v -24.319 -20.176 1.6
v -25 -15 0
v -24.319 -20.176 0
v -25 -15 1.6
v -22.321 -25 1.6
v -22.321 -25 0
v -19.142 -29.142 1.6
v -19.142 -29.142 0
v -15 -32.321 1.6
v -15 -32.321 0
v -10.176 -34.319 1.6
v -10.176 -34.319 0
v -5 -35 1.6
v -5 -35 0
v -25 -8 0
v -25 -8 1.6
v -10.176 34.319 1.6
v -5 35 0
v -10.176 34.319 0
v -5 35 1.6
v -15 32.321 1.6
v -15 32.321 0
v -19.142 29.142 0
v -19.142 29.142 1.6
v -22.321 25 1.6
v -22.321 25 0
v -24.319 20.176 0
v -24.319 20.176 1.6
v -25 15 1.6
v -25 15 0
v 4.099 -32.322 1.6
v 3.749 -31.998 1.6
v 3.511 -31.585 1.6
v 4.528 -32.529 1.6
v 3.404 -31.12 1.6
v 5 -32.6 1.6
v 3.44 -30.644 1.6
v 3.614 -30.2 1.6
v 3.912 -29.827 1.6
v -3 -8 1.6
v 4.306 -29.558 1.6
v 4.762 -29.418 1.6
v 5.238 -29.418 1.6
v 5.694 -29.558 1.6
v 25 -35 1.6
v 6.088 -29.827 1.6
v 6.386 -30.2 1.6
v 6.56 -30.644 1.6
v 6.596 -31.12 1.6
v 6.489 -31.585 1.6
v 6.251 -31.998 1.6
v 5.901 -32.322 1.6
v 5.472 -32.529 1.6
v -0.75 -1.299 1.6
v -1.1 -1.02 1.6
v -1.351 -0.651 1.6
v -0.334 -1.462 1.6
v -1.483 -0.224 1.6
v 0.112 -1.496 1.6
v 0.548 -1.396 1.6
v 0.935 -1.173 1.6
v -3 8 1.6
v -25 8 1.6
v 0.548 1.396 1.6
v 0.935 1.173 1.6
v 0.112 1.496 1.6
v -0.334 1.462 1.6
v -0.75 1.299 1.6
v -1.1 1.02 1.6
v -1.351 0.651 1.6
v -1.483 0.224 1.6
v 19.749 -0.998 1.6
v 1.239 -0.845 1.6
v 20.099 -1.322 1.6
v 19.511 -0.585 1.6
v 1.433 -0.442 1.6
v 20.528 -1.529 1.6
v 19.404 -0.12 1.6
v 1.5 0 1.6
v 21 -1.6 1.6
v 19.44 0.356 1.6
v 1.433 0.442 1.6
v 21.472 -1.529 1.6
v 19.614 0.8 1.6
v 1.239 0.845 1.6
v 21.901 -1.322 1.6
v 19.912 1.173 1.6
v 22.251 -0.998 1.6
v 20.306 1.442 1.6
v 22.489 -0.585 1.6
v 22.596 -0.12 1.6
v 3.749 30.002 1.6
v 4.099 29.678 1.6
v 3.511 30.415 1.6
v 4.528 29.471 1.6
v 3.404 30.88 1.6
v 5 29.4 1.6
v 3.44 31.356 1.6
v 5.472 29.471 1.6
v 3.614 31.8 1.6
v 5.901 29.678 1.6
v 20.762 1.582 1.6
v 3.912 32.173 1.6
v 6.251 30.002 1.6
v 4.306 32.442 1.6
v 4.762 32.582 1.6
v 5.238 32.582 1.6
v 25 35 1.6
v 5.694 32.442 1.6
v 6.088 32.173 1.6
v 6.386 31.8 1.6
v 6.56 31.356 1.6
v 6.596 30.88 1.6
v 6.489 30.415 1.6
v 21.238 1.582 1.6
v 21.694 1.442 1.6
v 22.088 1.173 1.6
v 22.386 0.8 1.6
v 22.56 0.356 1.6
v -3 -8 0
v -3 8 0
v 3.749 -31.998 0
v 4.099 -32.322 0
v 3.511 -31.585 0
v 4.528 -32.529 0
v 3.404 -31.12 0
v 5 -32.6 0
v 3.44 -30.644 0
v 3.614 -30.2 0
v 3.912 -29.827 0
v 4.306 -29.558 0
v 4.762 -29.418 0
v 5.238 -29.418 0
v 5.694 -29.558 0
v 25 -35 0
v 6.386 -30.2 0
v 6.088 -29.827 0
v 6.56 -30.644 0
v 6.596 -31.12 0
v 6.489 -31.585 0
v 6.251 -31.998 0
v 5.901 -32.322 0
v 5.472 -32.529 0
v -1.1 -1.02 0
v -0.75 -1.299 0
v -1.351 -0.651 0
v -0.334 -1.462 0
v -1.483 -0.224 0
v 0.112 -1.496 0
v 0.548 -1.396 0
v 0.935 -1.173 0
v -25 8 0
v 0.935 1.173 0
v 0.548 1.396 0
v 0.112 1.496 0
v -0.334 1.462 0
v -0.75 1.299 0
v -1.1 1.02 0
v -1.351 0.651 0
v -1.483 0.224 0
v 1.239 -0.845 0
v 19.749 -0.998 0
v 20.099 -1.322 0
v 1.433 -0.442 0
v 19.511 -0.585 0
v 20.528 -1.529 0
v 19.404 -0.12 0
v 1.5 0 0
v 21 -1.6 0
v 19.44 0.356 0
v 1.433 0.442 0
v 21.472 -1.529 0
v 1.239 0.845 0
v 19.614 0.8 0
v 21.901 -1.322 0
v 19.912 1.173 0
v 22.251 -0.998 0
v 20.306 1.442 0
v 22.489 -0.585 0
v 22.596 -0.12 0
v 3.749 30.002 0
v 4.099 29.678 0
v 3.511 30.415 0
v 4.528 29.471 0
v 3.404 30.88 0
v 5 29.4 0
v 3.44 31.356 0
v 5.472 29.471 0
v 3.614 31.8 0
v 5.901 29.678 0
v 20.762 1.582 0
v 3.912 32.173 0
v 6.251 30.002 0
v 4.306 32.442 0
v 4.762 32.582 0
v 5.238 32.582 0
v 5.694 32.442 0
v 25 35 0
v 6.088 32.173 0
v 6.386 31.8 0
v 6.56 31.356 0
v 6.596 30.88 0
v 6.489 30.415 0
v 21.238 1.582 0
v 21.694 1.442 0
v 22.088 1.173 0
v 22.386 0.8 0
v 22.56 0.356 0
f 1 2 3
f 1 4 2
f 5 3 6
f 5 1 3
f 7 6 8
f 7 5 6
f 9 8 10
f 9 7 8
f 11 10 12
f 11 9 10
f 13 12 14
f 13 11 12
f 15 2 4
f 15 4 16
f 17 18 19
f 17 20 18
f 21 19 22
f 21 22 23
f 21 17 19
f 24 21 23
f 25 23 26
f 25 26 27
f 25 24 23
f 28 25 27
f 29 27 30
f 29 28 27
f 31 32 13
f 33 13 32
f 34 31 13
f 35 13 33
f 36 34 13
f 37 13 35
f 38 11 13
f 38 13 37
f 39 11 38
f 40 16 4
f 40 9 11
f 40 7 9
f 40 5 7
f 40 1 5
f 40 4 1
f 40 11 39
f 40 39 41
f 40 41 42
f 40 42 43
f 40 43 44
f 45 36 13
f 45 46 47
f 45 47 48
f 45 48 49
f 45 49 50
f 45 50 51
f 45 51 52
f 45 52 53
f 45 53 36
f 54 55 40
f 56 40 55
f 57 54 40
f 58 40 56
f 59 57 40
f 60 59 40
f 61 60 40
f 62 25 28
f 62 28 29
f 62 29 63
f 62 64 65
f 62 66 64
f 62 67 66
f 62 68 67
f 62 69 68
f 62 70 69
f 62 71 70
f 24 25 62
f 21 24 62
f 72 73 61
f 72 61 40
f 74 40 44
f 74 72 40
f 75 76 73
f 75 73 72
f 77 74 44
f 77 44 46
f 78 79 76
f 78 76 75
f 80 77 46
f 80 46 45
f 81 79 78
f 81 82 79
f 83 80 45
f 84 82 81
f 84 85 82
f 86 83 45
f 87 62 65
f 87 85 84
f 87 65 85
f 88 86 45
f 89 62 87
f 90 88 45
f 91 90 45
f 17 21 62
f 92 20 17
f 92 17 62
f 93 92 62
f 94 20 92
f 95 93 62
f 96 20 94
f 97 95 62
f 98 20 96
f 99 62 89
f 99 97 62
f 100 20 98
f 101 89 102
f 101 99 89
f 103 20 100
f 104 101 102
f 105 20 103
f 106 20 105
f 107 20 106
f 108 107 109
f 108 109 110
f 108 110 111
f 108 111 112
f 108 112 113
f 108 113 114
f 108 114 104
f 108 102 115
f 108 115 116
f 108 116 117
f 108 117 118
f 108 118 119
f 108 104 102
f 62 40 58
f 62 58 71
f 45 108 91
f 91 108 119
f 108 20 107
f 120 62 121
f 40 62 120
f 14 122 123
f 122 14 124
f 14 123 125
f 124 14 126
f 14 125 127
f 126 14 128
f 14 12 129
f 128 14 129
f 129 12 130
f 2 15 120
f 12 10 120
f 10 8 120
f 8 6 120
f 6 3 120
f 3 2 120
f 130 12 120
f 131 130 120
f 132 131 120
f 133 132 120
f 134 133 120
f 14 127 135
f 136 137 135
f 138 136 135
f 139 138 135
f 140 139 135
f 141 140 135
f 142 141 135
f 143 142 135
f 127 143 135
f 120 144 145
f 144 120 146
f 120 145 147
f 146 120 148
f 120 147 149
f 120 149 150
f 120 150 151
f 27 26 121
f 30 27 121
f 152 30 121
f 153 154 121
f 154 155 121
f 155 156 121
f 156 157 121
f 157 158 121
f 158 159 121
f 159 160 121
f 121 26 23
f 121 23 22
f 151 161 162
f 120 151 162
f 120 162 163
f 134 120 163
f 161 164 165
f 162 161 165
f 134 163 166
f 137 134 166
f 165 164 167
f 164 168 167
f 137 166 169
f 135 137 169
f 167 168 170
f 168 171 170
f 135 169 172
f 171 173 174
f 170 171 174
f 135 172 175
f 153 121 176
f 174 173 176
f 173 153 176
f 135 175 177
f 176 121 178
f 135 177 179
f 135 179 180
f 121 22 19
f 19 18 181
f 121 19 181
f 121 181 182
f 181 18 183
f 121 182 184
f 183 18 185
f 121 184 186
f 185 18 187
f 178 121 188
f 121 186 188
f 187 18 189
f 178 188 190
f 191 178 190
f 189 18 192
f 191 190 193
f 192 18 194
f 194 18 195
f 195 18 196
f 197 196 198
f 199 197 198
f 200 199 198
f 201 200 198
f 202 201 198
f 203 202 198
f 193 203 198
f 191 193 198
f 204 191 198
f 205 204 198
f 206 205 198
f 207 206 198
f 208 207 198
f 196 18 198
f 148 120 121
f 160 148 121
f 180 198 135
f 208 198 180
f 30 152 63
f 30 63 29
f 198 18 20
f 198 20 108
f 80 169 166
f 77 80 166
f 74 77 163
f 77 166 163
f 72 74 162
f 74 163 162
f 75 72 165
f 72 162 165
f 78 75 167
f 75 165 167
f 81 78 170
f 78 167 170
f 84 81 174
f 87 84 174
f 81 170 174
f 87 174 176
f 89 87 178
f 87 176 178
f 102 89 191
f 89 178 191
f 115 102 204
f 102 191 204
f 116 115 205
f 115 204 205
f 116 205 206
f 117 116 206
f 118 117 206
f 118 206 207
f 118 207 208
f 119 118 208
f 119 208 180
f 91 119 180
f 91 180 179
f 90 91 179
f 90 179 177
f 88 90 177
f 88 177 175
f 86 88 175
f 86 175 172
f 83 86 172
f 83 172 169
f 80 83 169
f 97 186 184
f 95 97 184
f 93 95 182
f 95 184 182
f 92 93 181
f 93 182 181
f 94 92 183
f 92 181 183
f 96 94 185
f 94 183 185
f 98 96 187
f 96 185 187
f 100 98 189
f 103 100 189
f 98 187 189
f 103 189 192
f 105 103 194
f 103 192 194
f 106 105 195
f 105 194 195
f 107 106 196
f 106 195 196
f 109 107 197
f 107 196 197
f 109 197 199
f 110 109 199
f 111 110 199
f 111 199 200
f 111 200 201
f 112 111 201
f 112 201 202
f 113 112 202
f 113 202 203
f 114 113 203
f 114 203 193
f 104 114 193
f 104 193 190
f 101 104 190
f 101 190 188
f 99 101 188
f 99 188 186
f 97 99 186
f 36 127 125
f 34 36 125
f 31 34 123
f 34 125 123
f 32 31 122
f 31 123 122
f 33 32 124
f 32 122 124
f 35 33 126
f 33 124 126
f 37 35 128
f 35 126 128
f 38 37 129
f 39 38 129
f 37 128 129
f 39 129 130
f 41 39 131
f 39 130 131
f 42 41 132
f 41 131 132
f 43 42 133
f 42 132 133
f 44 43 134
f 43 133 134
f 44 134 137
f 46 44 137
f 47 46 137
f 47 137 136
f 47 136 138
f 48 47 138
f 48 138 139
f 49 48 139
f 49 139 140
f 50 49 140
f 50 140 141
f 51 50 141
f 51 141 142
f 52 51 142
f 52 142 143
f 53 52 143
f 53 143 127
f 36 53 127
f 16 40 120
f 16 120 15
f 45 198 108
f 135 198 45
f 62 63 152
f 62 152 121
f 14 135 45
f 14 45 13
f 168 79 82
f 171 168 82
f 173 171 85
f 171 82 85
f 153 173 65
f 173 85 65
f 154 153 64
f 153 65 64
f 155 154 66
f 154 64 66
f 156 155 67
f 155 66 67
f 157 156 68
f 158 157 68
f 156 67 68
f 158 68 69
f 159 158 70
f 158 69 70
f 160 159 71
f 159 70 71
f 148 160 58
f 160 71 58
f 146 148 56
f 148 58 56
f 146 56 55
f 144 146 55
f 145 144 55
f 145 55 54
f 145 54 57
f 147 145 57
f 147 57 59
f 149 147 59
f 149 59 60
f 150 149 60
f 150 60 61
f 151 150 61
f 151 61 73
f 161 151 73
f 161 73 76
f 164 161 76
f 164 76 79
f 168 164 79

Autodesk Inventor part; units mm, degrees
ref_plane "YZ Plane" through (0, 0, 0) normal (1, 0, 0) x (0, 1, 0)
ref_plane "XZ Plane" through (0, 0, 0) normal (0, 1, 0) x (-1, 0, 0)
ref_plane "XY Plane" through (0, 0, 0) normal (0, 0, 1) x (1, 0, 0)
sketch "スケッチ1" plane through (0, 0, 0) normal (0, 0, 1) x (1, 0, 0)
  line L0 (-25, 35) -> (25, 35)
  line L1 (25, 35) -> (25, -35)
  line L2 (25, -35) -> (-25, -35)
  line L3 (-25, -35) -> (-25, 35)
  point P0 (0, 0)
  point P1 (-25, 0)
  point P2 (0, 35)
  dimension "d0" = 50
  dimension "d1" = 70
extrude "押し出し1" add sketch "スケッチ1" along normal blind 1.6
sketch "スケッチ2" plane through (0, 0, 1.6) normal (0, 0, 1) x (1, 0, 0)
  line L0 (-25, 35) -> (-25, -35) projected
  line L1 (-25, 8) -> (-3, 8)
  line L2 (-3, 8) -> (-3, -8)
  line L3 (-3, -8) -> (-25, -8)
  line L4 (-25, -8) -> (-25, 8)
  circle A0 centre (0, 0) radius 1.5
  point P0 (-25, 0)
  dimension "d10" = 16
  dimension "d11" = 3
  dimension "d12" = 25
  dimension "d13" = 3
extrude "押し出し2" cut sketch "スケッチ2" against normal through all
fillet "フィレット1" radius 20 2 edges at (-25, -35, 0.8) (-25, 35, 0.8)
sketch "スケッチ3" plane through (0, 0, 1.6) normal (0, 0, 1) x (1, 0, 0)
  line L0 (25, -35) -> (25, 35) projected
  line L1 (25, 35) -> (-5, 35) projected
  line L2 (-30.9592, 0) -> (30.9592, 0) construction
  line L3 (-25, 8) -> (-3, 8) construction
  line L4 (-25, 15) -> (-25, 8) construction
  point P0 (0, 0)
  point P1 (21, 0)
  point P2 (-21, -12)
  point P3 (5, -31)
  point P4 (5, 31)
  point P5 (0, 0)
  dimension "d26" = 30
  dimension "d27" = 4
  dimension "d28" = 4
hole "穴1" at (5, 31, 1.6) at (21, 0, 1.6) at (5, -31, 1.6) direction (0, 0, -1) diameter 3.2 end through all
properties part number "PCB-main"
